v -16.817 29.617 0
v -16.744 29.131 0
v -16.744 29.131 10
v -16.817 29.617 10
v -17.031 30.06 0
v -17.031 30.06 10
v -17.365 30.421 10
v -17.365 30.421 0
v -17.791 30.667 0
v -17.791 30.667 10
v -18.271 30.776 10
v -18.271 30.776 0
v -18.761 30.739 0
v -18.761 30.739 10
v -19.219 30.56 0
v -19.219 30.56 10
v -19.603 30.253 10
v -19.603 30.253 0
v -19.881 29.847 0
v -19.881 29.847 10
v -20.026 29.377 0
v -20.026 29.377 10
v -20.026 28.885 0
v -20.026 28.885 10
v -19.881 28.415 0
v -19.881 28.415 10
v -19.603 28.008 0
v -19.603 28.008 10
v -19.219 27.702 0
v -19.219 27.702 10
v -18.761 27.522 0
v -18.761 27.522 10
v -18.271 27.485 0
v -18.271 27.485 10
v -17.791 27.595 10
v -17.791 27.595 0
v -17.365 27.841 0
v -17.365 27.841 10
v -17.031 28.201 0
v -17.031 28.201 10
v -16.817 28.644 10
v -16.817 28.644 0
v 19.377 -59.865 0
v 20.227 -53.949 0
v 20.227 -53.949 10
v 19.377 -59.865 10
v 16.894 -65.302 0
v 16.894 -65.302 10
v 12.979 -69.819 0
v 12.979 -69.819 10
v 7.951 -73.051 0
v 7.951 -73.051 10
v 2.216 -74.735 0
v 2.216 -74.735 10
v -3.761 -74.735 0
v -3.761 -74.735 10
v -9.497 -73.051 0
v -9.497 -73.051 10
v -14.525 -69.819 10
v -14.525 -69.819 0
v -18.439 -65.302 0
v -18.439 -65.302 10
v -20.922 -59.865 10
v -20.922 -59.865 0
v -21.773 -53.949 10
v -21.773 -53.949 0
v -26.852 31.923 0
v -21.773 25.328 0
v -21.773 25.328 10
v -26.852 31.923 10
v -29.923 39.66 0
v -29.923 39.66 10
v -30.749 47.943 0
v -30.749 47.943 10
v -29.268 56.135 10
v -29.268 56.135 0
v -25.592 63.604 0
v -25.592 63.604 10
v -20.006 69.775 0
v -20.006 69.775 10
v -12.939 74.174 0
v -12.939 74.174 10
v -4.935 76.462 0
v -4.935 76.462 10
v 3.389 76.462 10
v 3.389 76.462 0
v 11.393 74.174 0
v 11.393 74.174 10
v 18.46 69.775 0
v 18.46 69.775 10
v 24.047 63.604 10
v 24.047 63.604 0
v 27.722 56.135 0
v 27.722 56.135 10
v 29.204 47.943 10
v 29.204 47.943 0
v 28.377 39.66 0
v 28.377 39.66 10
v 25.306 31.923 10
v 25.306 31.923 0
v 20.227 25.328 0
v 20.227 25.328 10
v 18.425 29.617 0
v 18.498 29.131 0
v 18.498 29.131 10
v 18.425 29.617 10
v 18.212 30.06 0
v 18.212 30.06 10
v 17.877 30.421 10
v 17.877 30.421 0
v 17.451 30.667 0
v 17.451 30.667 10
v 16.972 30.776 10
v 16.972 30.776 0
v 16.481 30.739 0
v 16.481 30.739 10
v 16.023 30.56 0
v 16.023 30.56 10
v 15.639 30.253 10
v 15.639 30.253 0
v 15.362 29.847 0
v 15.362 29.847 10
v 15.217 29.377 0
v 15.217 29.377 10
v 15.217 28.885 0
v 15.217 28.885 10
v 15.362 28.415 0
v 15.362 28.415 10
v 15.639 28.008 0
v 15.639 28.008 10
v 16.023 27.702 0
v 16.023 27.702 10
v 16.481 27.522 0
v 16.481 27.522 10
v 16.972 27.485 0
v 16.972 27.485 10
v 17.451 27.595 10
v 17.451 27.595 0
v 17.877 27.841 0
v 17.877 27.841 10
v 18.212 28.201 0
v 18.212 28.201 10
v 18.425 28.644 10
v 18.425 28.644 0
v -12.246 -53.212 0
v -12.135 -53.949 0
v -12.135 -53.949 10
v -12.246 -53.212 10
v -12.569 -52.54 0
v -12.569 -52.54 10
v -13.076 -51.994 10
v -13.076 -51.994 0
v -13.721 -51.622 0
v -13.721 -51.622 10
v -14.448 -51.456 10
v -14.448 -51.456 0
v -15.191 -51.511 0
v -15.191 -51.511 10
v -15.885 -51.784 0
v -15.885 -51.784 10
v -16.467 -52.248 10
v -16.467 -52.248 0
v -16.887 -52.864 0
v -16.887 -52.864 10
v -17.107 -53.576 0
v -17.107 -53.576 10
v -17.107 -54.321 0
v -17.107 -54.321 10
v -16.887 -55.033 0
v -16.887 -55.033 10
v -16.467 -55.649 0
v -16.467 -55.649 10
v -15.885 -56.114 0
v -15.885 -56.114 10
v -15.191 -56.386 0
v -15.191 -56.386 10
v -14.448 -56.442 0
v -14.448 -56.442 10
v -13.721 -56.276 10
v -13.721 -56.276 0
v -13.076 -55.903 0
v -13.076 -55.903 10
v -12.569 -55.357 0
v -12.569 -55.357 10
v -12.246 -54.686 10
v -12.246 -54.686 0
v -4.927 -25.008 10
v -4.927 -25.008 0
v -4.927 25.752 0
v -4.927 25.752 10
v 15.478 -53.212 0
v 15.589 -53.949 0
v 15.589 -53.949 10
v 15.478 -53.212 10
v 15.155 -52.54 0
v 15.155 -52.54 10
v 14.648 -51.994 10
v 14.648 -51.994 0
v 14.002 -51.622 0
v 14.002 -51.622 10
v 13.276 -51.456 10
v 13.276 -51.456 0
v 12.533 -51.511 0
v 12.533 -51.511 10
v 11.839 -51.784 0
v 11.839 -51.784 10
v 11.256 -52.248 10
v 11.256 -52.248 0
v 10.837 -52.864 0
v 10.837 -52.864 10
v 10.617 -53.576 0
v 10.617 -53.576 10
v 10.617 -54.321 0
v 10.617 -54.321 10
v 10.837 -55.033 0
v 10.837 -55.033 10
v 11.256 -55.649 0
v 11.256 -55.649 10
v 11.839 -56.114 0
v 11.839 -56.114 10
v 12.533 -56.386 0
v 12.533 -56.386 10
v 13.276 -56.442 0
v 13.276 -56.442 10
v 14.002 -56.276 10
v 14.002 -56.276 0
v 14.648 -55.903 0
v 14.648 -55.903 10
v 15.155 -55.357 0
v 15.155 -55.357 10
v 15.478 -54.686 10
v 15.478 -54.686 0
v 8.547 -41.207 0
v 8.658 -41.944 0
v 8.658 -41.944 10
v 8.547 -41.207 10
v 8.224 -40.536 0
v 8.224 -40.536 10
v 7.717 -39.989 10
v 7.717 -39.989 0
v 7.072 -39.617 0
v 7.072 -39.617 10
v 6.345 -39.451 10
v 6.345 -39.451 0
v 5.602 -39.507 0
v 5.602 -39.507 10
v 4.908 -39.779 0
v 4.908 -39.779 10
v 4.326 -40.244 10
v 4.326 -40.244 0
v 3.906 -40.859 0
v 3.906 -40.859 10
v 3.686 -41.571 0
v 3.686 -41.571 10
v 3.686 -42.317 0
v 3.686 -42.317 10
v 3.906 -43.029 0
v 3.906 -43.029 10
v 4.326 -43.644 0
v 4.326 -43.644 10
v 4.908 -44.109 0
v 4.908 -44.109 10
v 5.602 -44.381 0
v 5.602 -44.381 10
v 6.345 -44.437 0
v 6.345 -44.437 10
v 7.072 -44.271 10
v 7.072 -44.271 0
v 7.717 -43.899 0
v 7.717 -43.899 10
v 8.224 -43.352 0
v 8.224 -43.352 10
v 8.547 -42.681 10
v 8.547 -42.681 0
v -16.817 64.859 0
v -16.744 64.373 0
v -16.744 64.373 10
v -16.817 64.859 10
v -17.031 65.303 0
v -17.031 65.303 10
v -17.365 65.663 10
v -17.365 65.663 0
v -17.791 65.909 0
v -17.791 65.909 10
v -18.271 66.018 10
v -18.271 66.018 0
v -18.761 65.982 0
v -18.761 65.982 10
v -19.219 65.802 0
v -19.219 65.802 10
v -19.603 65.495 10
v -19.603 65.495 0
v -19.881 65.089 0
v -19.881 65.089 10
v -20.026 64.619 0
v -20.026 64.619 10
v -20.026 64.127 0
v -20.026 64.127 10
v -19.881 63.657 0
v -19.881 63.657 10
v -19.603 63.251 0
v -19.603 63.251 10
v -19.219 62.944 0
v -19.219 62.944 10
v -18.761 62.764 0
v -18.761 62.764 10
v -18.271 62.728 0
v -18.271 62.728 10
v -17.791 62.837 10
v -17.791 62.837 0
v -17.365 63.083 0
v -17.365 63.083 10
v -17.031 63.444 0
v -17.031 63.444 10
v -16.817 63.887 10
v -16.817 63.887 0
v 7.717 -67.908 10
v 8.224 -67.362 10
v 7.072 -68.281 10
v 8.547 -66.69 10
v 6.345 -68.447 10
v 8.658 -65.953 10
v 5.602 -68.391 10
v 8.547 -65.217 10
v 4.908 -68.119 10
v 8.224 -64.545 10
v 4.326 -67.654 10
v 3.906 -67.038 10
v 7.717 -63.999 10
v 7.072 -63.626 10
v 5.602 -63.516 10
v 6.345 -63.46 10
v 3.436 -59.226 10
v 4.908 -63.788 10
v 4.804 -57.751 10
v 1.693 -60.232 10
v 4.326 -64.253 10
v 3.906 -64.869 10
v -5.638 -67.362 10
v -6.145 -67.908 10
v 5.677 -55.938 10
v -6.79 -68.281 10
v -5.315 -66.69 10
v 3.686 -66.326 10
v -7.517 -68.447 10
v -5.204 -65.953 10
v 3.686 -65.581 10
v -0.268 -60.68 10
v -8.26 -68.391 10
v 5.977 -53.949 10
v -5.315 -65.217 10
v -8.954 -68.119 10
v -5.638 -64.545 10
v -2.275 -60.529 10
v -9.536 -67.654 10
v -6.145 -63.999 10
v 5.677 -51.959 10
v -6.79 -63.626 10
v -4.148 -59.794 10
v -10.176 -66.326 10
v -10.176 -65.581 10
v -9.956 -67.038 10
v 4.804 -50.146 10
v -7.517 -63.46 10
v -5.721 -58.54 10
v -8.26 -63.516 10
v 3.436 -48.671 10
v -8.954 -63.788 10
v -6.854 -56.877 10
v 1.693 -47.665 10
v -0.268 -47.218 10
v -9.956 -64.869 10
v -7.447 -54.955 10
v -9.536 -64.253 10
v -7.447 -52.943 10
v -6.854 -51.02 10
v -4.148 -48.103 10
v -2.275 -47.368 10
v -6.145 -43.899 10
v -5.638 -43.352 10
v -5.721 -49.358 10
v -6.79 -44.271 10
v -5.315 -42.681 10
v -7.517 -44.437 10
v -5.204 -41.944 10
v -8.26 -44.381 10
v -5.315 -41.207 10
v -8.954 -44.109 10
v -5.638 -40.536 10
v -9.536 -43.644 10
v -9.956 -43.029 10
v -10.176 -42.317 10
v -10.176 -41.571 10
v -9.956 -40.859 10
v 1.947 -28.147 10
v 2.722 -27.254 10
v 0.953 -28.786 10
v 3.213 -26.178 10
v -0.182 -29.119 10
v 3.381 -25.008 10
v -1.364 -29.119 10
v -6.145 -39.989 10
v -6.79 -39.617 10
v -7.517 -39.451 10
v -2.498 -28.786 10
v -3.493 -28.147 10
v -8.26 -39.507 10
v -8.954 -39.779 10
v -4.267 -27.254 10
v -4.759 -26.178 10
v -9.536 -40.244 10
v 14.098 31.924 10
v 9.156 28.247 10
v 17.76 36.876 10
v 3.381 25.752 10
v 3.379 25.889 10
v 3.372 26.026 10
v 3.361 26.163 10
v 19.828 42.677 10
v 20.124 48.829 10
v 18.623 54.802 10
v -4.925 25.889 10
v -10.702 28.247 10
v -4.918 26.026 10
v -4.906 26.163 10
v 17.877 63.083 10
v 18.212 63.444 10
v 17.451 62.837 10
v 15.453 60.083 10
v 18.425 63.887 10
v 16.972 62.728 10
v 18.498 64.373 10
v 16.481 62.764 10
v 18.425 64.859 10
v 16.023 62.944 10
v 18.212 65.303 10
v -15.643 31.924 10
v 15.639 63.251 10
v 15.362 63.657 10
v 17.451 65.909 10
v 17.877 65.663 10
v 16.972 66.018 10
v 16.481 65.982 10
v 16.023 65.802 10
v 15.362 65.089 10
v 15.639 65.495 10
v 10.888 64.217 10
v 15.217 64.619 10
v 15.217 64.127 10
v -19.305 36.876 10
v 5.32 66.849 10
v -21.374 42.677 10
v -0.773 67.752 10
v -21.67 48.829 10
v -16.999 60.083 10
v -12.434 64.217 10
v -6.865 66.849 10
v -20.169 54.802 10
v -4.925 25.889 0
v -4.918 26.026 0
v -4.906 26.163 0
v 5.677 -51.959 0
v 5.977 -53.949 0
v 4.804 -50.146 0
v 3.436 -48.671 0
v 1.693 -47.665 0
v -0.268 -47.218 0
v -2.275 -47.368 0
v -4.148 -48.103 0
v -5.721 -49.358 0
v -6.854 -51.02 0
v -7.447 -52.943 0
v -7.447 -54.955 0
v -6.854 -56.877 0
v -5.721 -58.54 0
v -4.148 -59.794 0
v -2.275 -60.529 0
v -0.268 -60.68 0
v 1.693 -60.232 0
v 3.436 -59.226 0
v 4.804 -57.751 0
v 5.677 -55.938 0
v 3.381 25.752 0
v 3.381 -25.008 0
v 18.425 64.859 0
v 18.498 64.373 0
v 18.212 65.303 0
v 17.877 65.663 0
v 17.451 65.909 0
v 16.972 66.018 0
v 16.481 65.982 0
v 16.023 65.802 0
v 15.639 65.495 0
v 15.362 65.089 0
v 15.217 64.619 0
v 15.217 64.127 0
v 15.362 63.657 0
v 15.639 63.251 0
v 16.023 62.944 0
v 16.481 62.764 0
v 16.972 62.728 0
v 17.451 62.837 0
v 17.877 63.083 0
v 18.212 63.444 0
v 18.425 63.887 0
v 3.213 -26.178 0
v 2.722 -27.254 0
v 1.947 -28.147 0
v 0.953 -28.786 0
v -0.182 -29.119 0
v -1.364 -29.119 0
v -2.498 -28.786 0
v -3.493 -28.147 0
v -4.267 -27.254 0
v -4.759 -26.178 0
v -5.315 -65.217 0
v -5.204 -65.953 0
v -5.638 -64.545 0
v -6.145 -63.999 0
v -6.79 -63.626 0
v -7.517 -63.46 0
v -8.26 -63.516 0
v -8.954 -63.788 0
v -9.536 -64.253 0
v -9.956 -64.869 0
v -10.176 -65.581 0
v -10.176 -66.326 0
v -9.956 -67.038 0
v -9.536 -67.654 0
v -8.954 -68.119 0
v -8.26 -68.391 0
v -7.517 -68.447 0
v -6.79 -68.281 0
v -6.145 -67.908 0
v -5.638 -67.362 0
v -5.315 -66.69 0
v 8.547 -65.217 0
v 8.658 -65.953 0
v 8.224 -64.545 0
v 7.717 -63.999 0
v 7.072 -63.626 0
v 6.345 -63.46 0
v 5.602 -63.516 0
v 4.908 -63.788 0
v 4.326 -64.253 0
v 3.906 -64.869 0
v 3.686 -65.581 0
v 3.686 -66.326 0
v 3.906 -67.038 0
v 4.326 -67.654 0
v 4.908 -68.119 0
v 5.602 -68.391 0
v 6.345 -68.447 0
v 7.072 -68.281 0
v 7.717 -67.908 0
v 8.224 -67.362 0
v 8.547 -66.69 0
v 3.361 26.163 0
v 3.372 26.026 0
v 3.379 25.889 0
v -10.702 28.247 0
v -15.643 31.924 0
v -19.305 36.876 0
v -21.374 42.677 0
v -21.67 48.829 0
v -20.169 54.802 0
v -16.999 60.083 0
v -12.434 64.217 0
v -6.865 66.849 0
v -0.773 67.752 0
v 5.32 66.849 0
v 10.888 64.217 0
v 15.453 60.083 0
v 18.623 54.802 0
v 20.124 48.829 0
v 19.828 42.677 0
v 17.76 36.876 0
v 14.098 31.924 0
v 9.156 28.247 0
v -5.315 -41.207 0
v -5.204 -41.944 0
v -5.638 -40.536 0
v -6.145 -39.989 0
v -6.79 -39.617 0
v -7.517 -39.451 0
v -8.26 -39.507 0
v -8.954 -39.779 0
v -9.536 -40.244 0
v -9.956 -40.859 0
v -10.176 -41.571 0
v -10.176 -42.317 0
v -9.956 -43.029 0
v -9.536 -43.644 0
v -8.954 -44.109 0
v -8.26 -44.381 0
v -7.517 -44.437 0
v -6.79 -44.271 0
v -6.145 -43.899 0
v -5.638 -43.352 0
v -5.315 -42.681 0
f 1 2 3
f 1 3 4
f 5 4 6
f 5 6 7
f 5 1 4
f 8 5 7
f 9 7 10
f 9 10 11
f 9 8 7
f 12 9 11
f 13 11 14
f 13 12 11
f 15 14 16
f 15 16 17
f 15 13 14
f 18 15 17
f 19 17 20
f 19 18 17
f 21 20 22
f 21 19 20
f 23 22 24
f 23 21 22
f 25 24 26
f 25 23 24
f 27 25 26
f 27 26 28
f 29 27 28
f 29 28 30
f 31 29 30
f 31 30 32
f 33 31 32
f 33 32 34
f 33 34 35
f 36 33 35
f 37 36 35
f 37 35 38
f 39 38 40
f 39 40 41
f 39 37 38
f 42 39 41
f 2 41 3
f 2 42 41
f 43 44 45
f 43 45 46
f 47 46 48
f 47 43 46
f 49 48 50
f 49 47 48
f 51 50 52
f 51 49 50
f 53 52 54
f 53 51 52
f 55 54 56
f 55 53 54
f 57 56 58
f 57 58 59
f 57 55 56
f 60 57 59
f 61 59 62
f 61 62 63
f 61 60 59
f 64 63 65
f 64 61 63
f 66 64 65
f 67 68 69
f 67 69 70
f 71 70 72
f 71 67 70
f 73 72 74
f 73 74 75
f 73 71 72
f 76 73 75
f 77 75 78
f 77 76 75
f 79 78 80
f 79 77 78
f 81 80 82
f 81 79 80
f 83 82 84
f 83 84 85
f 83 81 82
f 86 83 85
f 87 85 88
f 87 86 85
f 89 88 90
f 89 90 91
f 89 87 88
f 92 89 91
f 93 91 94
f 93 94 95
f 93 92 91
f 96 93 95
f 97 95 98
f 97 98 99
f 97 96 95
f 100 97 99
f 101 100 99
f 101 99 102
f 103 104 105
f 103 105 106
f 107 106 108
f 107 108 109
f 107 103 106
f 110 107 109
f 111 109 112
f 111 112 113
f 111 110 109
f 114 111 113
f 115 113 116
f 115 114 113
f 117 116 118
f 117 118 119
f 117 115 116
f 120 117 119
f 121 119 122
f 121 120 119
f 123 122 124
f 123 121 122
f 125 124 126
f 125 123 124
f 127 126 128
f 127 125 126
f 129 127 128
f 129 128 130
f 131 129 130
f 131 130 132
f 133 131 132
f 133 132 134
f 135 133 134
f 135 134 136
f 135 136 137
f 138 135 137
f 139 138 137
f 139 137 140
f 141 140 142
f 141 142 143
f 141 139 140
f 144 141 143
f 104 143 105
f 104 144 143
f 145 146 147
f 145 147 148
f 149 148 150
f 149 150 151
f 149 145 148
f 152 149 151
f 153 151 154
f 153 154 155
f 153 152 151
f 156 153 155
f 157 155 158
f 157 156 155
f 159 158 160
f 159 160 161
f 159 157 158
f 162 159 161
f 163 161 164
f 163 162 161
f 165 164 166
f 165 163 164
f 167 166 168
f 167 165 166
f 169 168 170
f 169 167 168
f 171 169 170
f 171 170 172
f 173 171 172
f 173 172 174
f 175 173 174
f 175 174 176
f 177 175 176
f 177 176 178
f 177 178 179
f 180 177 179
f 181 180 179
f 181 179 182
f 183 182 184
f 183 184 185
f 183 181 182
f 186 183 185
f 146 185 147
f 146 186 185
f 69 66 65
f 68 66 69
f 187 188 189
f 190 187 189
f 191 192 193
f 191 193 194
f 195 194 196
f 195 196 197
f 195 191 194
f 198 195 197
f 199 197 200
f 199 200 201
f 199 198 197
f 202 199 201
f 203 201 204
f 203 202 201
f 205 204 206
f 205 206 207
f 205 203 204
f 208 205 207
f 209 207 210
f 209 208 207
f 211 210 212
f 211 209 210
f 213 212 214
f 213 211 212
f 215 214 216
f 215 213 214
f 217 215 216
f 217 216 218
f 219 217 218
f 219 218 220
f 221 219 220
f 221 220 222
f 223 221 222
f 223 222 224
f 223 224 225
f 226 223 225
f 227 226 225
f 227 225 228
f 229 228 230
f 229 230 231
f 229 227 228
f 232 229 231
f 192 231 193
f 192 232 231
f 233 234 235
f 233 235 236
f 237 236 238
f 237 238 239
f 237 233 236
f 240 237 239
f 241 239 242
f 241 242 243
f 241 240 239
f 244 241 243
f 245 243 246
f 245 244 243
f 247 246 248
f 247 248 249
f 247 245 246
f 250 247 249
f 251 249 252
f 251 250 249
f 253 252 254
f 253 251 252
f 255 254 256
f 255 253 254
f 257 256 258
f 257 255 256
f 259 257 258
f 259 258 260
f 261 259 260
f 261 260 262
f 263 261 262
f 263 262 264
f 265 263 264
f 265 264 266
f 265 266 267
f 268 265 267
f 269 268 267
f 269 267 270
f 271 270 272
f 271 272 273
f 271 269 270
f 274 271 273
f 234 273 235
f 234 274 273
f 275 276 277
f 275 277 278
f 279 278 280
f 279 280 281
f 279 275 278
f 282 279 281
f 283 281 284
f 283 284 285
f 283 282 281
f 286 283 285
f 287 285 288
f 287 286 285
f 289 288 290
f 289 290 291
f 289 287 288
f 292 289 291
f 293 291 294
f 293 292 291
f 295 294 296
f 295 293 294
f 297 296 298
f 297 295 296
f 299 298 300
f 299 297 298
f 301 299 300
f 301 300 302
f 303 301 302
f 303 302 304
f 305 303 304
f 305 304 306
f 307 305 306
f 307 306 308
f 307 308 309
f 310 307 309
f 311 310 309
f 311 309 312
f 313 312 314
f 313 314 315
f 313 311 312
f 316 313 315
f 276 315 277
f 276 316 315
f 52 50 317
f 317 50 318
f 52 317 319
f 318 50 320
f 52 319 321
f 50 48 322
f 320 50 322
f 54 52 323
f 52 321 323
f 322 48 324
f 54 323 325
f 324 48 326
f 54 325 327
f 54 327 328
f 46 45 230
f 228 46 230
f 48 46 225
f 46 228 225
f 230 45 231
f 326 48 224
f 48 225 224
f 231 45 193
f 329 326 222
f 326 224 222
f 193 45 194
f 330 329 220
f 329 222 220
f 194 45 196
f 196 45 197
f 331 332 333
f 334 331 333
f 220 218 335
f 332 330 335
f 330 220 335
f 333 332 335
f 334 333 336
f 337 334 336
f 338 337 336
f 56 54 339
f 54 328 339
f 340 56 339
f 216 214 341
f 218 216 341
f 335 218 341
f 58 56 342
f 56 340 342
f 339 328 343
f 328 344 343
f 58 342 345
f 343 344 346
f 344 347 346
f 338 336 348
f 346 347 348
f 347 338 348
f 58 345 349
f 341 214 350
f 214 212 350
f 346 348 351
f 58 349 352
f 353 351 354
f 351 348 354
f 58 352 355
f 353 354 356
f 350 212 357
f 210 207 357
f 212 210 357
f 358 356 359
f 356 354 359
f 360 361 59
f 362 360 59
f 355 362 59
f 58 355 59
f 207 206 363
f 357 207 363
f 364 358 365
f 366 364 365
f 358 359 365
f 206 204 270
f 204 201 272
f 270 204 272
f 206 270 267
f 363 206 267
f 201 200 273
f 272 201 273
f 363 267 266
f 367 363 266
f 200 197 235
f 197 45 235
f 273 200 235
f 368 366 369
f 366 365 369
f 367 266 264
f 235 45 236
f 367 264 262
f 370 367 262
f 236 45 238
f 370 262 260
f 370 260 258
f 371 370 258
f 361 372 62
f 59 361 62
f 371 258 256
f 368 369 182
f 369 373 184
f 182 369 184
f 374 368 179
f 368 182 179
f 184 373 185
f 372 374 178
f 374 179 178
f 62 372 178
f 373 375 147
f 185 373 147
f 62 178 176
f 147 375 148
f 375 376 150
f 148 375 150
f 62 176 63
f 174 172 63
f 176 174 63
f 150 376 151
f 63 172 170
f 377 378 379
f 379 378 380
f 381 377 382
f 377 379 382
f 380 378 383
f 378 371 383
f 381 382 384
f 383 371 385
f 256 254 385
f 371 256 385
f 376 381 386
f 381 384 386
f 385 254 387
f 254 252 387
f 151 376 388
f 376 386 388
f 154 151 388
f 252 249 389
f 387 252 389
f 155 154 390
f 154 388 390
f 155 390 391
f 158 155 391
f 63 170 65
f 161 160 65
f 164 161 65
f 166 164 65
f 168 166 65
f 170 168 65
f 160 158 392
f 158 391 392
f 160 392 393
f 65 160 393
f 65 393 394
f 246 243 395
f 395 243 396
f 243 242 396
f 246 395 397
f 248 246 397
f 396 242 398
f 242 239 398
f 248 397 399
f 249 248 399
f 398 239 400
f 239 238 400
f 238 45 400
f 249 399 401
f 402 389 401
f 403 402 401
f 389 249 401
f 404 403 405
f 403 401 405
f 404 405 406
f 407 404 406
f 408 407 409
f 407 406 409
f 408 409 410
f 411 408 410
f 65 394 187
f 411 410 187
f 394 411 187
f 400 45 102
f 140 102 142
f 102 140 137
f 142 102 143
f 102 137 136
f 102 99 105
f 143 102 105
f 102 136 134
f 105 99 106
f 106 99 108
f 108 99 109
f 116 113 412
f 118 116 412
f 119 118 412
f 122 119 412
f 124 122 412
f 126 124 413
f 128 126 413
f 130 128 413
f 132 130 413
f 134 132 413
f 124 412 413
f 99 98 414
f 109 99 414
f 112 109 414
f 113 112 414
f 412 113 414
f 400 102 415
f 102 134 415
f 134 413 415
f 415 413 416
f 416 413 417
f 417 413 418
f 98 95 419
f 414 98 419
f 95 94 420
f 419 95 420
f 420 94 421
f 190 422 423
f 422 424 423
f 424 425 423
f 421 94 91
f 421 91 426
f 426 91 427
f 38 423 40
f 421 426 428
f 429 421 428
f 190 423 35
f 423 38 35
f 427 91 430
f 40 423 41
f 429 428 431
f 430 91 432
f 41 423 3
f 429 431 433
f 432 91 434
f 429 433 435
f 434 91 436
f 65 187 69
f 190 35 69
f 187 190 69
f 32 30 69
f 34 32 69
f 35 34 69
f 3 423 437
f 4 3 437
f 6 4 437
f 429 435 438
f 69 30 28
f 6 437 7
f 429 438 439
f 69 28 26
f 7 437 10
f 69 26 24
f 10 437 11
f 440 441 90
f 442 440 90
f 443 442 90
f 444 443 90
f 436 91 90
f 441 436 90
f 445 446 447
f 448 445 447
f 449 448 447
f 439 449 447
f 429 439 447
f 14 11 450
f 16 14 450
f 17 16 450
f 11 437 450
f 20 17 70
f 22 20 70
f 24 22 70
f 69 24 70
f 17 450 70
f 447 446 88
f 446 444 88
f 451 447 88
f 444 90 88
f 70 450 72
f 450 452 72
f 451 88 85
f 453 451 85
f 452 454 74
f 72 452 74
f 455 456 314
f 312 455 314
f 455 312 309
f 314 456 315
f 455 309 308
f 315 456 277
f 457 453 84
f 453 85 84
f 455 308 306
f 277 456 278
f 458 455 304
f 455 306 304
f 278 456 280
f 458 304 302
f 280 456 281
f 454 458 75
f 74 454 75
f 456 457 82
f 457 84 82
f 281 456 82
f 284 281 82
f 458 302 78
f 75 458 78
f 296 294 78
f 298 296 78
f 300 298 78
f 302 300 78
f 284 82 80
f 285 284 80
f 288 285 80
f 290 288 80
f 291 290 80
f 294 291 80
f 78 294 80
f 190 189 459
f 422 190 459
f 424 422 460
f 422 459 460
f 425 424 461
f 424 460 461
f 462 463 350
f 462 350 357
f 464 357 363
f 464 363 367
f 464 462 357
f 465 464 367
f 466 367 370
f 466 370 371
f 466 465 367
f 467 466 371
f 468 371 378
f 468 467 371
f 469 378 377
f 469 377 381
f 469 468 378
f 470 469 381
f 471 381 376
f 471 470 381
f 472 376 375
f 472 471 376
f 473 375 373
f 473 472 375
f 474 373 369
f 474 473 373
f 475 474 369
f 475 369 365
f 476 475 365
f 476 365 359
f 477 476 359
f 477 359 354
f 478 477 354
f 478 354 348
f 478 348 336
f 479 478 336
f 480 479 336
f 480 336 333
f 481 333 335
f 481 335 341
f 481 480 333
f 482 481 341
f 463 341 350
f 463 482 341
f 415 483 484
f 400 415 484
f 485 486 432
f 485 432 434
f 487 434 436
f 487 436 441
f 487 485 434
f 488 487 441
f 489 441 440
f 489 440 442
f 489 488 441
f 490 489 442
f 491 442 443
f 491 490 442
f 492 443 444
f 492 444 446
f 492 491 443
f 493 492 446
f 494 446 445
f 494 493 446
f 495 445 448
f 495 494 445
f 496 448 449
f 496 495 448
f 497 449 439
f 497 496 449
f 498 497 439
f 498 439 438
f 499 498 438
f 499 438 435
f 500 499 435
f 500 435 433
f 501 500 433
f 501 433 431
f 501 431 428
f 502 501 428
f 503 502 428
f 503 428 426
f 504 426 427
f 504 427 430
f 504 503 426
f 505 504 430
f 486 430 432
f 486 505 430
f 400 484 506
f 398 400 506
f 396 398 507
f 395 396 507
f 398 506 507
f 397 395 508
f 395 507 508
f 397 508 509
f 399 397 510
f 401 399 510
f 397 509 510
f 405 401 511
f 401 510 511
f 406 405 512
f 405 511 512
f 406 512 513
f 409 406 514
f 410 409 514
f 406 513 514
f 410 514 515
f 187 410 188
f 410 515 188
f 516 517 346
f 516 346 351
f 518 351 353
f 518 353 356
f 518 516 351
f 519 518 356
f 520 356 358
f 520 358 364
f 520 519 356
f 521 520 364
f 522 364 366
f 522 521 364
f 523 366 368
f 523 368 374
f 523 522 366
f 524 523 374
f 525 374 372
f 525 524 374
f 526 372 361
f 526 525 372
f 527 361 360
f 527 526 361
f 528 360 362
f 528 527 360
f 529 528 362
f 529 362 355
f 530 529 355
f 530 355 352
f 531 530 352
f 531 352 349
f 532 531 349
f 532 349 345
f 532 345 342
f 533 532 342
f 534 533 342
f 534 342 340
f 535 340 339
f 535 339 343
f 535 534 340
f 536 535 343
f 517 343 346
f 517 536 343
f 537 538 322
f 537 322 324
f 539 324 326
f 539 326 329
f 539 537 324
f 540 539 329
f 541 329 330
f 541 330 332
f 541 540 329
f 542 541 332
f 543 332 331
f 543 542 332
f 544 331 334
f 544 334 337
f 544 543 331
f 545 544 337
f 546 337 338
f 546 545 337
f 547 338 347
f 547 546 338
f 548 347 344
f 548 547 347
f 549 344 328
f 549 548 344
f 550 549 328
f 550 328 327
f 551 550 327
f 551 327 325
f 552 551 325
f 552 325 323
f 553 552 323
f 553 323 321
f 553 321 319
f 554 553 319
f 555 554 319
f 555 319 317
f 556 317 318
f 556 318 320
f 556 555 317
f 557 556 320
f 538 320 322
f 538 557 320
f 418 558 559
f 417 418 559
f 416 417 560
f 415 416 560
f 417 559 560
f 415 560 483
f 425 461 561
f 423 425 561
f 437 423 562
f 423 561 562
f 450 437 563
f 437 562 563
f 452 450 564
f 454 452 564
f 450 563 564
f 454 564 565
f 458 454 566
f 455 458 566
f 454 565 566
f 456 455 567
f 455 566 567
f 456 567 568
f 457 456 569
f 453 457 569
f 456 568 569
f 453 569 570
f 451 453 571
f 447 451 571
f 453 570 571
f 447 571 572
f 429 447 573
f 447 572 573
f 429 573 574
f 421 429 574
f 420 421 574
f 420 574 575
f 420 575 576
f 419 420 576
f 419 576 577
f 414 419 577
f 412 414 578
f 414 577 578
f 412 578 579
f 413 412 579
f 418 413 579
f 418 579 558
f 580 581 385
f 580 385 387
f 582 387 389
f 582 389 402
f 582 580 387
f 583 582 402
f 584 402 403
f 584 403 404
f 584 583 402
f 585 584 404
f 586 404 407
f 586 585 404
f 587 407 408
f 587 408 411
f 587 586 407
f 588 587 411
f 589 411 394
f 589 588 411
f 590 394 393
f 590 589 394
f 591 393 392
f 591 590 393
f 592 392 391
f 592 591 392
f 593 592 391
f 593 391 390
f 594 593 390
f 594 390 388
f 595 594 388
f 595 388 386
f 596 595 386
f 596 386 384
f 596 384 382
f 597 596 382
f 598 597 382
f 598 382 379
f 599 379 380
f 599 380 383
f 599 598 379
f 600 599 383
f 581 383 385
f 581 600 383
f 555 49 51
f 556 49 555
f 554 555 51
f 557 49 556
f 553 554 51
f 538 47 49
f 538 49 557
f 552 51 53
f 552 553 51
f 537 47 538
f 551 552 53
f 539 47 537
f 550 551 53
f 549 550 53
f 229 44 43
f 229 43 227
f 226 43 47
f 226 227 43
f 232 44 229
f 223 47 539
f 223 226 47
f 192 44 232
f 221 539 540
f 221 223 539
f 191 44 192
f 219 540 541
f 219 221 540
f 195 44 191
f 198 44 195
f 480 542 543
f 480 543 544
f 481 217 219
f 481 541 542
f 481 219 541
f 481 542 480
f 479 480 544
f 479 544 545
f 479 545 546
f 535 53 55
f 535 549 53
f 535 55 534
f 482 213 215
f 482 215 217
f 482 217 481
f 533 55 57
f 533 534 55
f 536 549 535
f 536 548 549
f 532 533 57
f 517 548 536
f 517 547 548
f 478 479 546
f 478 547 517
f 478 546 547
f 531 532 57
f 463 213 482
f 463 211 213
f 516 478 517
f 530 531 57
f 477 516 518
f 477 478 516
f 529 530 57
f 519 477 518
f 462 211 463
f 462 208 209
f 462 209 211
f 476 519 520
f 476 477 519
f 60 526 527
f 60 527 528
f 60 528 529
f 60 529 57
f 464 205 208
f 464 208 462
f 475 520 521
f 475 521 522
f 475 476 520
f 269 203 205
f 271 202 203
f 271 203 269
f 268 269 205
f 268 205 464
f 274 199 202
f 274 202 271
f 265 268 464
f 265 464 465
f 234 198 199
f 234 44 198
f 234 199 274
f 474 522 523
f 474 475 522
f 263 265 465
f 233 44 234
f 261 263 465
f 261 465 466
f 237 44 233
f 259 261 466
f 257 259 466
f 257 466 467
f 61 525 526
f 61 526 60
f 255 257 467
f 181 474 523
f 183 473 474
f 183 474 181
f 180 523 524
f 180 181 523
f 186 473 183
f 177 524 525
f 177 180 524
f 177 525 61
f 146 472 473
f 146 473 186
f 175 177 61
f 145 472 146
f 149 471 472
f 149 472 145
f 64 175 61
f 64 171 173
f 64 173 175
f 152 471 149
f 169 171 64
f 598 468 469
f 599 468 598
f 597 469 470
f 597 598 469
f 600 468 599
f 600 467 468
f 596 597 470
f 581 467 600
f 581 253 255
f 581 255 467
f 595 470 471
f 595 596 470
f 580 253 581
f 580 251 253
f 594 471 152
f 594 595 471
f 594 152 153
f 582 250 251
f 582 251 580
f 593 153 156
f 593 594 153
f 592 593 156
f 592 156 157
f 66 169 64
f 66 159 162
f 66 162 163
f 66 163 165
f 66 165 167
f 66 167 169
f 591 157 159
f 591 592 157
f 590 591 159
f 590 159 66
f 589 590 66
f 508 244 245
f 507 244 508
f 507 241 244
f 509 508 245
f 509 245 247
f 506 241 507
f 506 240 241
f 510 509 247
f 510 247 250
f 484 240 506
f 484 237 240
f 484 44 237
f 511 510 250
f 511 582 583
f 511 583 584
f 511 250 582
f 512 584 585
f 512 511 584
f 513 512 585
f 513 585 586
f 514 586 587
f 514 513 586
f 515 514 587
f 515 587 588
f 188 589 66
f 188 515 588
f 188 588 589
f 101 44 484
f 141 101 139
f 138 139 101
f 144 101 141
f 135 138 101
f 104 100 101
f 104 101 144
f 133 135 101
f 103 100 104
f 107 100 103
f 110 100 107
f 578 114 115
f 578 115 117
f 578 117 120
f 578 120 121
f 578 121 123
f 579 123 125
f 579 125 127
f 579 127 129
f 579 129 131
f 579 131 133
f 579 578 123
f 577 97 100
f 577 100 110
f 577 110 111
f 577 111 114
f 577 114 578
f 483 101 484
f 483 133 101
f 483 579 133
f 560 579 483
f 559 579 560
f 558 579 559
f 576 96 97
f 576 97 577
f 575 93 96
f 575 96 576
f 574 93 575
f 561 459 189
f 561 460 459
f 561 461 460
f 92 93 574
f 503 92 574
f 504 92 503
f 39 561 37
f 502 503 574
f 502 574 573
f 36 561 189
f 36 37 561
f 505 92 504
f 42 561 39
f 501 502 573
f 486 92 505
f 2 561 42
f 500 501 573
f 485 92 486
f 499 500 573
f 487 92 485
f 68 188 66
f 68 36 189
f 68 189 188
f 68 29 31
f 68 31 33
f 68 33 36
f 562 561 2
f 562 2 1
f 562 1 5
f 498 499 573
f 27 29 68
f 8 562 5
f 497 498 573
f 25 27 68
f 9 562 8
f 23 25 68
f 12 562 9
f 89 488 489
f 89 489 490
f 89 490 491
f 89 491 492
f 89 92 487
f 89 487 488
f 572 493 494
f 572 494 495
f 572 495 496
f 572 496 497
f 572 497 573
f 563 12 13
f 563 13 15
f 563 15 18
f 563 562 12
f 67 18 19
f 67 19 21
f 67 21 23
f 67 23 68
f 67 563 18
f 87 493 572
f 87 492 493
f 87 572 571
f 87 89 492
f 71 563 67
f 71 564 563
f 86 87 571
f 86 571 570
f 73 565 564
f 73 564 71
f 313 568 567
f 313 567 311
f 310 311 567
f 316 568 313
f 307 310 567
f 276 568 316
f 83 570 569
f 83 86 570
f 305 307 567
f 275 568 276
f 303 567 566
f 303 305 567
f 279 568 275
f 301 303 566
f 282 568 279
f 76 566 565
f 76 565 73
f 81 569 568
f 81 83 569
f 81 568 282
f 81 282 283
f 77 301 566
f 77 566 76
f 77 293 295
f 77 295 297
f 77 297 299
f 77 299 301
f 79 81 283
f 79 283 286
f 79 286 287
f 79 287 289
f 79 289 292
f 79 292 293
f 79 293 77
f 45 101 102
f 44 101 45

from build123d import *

# Parameters (mm, degrees)
SKETCH1_R           = 6.75
SKETCH1_R_2         = 2.5
SKETCH1_R_3         = 1.65
SKETCH1_R_4         = 1.650080795
BOSS_EXTRUDE2_DEPTH = 10


with BuildPart() as part:
    # Sketch1 → Boss-Extrude2 (new body)
    with BuildSketch(Plane.XY):
        with BuildLine():
            Line((20.227196856, 25.327636264), (20.227196856, -53.948714213))
            ThreePointArc((20.227196856, -53.948714213), (-0.772803144, -74.948714213), (-21.772803144, -53.948714213))
            Line((-21.772803144, -53.948714213), (-21.772803144, 25.327636264))
            ThreePointArc((-21.772803144, 25.327636264), (-0.772803144, 76.751921549), (20.227196856, 25.327636264))
        make_face()
        with Locations((-0.772803144, -53.948714213)):
            Circle(SKETCH1_R, mode=Mode.SUBTRACT)
        with Locations((13.089121207, -53.948714213)):
            Circle(SKETCH1_R_2, mode=Mode.SUBTRACT)
        with Locations((6.158159031, -65.953492847)):
            Circle(SKETCH1_R_2, mode=Mode.SUBTRACT)
        with Locations((-7.703765319, -65.953492847)):
            Circle(SKETCH1_R_2, mode=Mode.SUBTRACT)
        with Locations((-14.634727495, -53.948714213)):
            Circle(SKETCH1_R_2, mode=Mode.SUBTRACT)
        with Locations((-7.703765319, -41.94393558)):
            Circle(SKETCH1_R_2, mode=Mode.SUBTRACT)
        with Locations((6.158159031, -41.94393558)):
            Circle(SKETCH1_R_2, mode=Mode.SUBTRACT)
        with Locations((-18.393960021, 64.373078426)):
            Circle(SKETCH1_R_3, mode=Mode.SUBTRACT)
        with Locations((-18.393960021, 29.130764673)):
            Circle(SKETCH1_R_3, mode=Mode.SUBTRACT)
        with Locations((16.848353733, 29.130764673)):
            Circle(SKETCH1_R_4, mode=Mode.SUBTRACT)
        with Locations((16.848353733, 64.373078426)):
            Circle(SKETCH1_R_3, mode=Mode.SUBTRACT)
        with BuildLine():
            Line((3.381188434, 25.751921549), (3.381188434, -25.007695686))
            ThreePointArc((3.381188434, -25.007695686), (-0.772803144, -29.161687264), (-4.926794722, -25.007695686))
            Line((-4.926794722, -25.007695686), (-4.926794722, 25.751921549))
            ThreePointArc((-4.926794722, 25.751921549), (-4.921699763, 25.957598174), (-4.906427385, 26.162770264))
            ThreePointArc((-4.906427385, 26.162770264), (-0.772803144, 67.751921549), (3.360821097, 26.162770264))
            ThreePointArc((3.360821097, 26.162770264), (3.376093476, 25.957598174), (3.381188434, 25.751921549))
        make_face(mode=Mode.SUBTRACT)
    extrude(amount=BOSS_EXTRUDE2_DEPTH)


solid = part.part
